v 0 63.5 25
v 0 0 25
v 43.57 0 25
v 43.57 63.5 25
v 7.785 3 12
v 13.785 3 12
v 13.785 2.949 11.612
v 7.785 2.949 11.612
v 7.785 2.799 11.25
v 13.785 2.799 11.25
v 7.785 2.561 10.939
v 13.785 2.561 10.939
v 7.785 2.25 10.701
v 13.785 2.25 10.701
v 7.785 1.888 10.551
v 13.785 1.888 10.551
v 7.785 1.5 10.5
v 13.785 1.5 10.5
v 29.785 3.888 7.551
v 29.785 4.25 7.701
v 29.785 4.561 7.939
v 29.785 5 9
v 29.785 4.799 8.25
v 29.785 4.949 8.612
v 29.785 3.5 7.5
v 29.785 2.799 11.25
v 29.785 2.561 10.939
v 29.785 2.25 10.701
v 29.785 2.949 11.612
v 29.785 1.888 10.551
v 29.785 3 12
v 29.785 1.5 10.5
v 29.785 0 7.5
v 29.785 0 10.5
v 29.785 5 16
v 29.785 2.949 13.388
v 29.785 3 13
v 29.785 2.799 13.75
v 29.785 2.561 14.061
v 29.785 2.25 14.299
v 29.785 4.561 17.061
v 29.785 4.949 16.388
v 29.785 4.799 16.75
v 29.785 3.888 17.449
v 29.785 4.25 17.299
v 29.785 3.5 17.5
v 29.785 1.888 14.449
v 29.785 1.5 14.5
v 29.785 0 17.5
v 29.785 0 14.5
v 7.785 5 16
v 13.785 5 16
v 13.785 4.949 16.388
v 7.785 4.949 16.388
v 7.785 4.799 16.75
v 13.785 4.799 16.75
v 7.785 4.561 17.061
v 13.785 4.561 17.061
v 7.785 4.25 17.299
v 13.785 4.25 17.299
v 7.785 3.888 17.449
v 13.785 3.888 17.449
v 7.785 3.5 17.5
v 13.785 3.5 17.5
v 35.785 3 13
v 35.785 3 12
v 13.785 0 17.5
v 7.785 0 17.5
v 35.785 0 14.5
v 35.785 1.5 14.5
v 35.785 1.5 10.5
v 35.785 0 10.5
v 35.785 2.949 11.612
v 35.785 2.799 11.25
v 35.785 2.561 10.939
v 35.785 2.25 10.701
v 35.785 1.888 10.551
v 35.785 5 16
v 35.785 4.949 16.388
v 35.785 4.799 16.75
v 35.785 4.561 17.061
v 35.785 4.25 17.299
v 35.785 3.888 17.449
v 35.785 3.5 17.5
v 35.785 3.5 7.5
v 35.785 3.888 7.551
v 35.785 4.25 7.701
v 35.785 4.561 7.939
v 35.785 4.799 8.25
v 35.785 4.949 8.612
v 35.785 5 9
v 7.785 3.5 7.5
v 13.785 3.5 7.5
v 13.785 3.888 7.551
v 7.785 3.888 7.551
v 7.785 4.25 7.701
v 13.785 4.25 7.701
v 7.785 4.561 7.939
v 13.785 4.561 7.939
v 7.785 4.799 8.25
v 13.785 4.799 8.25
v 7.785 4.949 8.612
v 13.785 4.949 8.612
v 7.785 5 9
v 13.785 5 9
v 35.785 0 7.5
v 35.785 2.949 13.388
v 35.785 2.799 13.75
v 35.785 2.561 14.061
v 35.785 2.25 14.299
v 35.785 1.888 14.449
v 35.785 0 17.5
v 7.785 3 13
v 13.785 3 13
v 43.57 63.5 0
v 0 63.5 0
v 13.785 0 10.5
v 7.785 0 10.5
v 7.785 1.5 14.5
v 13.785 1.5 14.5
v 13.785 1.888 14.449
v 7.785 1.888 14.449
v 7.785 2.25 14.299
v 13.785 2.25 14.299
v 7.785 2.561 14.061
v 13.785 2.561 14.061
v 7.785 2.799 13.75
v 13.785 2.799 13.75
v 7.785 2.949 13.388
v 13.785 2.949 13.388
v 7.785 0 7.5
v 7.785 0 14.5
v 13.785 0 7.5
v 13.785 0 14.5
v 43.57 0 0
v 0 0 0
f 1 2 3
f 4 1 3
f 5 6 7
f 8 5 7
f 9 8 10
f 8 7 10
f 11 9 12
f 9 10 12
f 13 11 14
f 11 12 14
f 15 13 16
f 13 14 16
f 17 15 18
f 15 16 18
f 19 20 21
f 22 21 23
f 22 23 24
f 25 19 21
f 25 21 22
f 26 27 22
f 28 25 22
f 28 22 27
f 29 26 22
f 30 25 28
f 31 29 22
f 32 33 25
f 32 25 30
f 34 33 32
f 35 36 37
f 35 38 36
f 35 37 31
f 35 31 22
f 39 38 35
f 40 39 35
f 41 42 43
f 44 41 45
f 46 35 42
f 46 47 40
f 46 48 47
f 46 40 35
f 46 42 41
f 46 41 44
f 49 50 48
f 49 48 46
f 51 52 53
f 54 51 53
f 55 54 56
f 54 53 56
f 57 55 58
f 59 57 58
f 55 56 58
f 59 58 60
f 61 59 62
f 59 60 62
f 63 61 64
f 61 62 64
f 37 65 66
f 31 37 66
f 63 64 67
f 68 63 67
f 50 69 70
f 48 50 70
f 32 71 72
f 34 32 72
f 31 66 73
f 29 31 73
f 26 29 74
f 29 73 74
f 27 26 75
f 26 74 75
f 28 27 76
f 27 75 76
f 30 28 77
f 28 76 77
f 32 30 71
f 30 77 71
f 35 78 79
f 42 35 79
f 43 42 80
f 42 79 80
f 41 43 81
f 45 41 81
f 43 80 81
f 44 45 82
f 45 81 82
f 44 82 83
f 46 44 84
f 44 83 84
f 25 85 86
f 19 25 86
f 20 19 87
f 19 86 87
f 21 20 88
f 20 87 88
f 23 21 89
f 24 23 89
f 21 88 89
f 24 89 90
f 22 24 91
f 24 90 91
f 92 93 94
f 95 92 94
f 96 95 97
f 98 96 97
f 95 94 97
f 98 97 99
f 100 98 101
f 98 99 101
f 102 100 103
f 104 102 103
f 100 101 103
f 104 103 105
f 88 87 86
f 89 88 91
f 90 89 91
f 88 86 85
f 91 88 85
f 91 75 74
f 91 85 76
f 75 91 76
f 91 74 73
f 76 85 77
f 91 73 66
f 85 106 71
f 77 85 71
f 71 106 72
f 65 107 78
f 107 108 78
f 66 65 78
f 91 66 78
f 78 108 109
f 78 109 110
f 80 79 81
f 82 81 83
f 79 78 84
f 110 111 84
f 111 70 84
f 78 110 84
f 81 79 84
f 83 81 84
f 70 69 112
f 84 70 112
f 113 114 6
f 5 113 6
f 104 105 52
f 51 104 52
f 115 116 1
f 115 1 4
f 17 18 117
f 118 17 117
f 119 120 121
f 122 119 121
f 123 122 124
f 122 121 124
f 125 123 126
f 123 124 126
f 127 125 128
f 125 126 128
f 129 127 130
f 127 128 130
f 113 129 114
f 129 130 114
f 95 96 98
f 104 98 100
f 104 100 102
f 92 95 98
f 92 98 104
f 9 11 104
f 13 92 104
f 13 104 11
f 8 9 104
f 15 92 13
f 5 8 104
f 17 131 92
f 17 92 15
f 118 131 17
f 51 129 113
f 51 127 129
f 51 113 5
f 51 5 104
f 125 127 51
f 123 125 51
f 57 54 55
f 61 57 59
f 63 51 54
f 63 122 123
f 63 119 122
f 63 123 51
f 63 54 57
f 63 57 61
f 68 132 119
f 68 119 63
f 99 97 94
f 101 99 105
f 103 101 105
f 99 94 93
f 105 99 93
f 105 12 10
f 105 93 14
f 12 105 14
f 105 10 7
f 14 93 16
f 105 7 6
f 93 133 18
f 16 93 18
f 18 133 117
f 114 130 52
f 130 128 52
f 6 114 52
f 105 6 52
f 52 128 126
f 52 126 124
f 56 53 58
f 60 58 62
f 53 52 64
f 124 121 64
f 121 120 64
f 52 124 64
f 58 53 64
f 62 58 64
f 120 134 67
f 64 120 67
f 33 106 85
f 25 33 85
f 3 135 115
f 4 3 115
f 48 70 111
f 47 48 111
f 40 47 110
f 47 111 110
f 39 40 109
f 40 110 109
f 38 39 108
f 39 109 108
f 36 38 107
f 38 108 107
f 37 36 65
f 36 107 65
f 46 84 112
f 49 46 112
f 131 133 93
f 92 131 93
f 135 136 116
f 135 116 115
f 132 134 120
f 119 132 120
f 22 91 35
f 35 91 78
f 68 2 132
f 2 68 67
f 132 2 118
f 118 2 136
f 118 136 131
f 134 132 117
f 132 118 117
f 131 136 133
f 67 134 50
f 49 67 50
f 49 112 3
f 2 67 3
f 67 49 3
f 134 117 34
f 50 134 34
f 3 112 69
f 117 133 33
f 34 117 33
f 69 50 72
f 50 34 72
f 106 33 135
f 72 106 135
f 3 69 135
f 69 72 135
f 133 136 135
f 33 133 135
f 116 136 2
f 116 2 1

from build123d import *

# Parameters (mm, degrees)
SKETCH1_W           = 43.57
SKETCH1_H           = 63.5
BOSS_EXTRUDE1_DEPTH = 25
CUT_EXTRUDE2_DEPTH  = 81.966628311
SKETCH4_W           = 43.57
SKETCH4_H           = 25
SKETCH4_W_2         = 6
SKETCH4_H_2         = 15
BOSS_EXTRUDE2_DEPTH = 9


with BuildPart() as part:
    # Sketch1 → Boss-Extrude1 (new body)
    with BuildSketch(Plane.XY):
        with Locations((21.785, 31.75)):
            Rectangle(SKETCH1_W, SKETCH1_H)
    extrude(amount=BOSS_EXTRUDE1_DEPTH)

    # Sketch3 → Cut-Extrude2 (cut, through all)
    with BuildSketch(Plane(origin=(43.57, 0, 0), x_dir=(0, 0, -1), z_dir=(1, 0, 0))):
        with BuildLine():
            Line((-14.5, 0), (-14.5, 1.5))
            ThreePointArc((-14.5, 1.5), (-14.060660172, 2.560660172), (-13, 3))
            Line((-13, 3), (-12, 3))
            ThreePointArc((-12, 3), (-10.939339828, 2.560660172), (-10.5, 1.5))
            Line((-10.5, 1.5), (-10.5, 0))
            Line((-10.5, 0), (-7.5, 0))
            Line((-7.5, 0), (-7.5, 3.5))
            ThreePointArc((-7.5, 3.5), (-7.939339828, 4.560660172), (-9, 5))
            Line((-9, 5), (-16, 5))
            ThreePointArc((-16, 5), (-17.060660172, 4.560660172), (-17.5, 3.5))
            Line((-17.5, 3.5), (-17.5, 0))
            Line((-17.5, 0), (-14.5, 0))
        make_face()
    extrude(amount=-CUT_EXTRUDE2_DEPTH, mode=Mode.SUBTRACT)


with BuildPart() as cut_extrude2_piece_1:
    # of the separate pieces the step leaves, piece 1, a body of its own (cut_extrude2_pieces)
    add(part.part.solids().sort_by_distance((0, 0, 0))[0])



with BuildPart() as cut_extrude2_piece_2:
    # of the separate pieces the step leaves, piece 2, a body of its own (cut_extrude2_pieces)
    add(part.part.solids().sort_by_distance((43.57, 0, 10.5))[0])


with BuildPart() as cut_extrude2_piece_1_1:
    add(cut_extrude2_piece_1.part)

    add(cut_extrude2_piece_2.part)  # Boss-Extrude2 merges Cut-Extrude2 piece 2
    # Sketch4 → Boss-Extrude2 (add)
    with BuildSketch(Plane.XZ):
        with Locations((21.785, 12.5)):
            Rectangle(SKETCH4_W, SKETCH4_H)
        with Locations((10.785, 12.5)):
            Rectangle(SKETCH4_W_2, SKETCH4_H_2, mode=Mode.SUBTRACT)
        with Locations((32.785, 12.5)):
            Rectangle(SKETCH4_W_2, SKETCH4_H_2, mode=Mode.SUBTRACT)
    extrude(amount=-BOSS_EXTRUDE2_DEPTH)


solid = cut_extrude2_piece_1_1.part
